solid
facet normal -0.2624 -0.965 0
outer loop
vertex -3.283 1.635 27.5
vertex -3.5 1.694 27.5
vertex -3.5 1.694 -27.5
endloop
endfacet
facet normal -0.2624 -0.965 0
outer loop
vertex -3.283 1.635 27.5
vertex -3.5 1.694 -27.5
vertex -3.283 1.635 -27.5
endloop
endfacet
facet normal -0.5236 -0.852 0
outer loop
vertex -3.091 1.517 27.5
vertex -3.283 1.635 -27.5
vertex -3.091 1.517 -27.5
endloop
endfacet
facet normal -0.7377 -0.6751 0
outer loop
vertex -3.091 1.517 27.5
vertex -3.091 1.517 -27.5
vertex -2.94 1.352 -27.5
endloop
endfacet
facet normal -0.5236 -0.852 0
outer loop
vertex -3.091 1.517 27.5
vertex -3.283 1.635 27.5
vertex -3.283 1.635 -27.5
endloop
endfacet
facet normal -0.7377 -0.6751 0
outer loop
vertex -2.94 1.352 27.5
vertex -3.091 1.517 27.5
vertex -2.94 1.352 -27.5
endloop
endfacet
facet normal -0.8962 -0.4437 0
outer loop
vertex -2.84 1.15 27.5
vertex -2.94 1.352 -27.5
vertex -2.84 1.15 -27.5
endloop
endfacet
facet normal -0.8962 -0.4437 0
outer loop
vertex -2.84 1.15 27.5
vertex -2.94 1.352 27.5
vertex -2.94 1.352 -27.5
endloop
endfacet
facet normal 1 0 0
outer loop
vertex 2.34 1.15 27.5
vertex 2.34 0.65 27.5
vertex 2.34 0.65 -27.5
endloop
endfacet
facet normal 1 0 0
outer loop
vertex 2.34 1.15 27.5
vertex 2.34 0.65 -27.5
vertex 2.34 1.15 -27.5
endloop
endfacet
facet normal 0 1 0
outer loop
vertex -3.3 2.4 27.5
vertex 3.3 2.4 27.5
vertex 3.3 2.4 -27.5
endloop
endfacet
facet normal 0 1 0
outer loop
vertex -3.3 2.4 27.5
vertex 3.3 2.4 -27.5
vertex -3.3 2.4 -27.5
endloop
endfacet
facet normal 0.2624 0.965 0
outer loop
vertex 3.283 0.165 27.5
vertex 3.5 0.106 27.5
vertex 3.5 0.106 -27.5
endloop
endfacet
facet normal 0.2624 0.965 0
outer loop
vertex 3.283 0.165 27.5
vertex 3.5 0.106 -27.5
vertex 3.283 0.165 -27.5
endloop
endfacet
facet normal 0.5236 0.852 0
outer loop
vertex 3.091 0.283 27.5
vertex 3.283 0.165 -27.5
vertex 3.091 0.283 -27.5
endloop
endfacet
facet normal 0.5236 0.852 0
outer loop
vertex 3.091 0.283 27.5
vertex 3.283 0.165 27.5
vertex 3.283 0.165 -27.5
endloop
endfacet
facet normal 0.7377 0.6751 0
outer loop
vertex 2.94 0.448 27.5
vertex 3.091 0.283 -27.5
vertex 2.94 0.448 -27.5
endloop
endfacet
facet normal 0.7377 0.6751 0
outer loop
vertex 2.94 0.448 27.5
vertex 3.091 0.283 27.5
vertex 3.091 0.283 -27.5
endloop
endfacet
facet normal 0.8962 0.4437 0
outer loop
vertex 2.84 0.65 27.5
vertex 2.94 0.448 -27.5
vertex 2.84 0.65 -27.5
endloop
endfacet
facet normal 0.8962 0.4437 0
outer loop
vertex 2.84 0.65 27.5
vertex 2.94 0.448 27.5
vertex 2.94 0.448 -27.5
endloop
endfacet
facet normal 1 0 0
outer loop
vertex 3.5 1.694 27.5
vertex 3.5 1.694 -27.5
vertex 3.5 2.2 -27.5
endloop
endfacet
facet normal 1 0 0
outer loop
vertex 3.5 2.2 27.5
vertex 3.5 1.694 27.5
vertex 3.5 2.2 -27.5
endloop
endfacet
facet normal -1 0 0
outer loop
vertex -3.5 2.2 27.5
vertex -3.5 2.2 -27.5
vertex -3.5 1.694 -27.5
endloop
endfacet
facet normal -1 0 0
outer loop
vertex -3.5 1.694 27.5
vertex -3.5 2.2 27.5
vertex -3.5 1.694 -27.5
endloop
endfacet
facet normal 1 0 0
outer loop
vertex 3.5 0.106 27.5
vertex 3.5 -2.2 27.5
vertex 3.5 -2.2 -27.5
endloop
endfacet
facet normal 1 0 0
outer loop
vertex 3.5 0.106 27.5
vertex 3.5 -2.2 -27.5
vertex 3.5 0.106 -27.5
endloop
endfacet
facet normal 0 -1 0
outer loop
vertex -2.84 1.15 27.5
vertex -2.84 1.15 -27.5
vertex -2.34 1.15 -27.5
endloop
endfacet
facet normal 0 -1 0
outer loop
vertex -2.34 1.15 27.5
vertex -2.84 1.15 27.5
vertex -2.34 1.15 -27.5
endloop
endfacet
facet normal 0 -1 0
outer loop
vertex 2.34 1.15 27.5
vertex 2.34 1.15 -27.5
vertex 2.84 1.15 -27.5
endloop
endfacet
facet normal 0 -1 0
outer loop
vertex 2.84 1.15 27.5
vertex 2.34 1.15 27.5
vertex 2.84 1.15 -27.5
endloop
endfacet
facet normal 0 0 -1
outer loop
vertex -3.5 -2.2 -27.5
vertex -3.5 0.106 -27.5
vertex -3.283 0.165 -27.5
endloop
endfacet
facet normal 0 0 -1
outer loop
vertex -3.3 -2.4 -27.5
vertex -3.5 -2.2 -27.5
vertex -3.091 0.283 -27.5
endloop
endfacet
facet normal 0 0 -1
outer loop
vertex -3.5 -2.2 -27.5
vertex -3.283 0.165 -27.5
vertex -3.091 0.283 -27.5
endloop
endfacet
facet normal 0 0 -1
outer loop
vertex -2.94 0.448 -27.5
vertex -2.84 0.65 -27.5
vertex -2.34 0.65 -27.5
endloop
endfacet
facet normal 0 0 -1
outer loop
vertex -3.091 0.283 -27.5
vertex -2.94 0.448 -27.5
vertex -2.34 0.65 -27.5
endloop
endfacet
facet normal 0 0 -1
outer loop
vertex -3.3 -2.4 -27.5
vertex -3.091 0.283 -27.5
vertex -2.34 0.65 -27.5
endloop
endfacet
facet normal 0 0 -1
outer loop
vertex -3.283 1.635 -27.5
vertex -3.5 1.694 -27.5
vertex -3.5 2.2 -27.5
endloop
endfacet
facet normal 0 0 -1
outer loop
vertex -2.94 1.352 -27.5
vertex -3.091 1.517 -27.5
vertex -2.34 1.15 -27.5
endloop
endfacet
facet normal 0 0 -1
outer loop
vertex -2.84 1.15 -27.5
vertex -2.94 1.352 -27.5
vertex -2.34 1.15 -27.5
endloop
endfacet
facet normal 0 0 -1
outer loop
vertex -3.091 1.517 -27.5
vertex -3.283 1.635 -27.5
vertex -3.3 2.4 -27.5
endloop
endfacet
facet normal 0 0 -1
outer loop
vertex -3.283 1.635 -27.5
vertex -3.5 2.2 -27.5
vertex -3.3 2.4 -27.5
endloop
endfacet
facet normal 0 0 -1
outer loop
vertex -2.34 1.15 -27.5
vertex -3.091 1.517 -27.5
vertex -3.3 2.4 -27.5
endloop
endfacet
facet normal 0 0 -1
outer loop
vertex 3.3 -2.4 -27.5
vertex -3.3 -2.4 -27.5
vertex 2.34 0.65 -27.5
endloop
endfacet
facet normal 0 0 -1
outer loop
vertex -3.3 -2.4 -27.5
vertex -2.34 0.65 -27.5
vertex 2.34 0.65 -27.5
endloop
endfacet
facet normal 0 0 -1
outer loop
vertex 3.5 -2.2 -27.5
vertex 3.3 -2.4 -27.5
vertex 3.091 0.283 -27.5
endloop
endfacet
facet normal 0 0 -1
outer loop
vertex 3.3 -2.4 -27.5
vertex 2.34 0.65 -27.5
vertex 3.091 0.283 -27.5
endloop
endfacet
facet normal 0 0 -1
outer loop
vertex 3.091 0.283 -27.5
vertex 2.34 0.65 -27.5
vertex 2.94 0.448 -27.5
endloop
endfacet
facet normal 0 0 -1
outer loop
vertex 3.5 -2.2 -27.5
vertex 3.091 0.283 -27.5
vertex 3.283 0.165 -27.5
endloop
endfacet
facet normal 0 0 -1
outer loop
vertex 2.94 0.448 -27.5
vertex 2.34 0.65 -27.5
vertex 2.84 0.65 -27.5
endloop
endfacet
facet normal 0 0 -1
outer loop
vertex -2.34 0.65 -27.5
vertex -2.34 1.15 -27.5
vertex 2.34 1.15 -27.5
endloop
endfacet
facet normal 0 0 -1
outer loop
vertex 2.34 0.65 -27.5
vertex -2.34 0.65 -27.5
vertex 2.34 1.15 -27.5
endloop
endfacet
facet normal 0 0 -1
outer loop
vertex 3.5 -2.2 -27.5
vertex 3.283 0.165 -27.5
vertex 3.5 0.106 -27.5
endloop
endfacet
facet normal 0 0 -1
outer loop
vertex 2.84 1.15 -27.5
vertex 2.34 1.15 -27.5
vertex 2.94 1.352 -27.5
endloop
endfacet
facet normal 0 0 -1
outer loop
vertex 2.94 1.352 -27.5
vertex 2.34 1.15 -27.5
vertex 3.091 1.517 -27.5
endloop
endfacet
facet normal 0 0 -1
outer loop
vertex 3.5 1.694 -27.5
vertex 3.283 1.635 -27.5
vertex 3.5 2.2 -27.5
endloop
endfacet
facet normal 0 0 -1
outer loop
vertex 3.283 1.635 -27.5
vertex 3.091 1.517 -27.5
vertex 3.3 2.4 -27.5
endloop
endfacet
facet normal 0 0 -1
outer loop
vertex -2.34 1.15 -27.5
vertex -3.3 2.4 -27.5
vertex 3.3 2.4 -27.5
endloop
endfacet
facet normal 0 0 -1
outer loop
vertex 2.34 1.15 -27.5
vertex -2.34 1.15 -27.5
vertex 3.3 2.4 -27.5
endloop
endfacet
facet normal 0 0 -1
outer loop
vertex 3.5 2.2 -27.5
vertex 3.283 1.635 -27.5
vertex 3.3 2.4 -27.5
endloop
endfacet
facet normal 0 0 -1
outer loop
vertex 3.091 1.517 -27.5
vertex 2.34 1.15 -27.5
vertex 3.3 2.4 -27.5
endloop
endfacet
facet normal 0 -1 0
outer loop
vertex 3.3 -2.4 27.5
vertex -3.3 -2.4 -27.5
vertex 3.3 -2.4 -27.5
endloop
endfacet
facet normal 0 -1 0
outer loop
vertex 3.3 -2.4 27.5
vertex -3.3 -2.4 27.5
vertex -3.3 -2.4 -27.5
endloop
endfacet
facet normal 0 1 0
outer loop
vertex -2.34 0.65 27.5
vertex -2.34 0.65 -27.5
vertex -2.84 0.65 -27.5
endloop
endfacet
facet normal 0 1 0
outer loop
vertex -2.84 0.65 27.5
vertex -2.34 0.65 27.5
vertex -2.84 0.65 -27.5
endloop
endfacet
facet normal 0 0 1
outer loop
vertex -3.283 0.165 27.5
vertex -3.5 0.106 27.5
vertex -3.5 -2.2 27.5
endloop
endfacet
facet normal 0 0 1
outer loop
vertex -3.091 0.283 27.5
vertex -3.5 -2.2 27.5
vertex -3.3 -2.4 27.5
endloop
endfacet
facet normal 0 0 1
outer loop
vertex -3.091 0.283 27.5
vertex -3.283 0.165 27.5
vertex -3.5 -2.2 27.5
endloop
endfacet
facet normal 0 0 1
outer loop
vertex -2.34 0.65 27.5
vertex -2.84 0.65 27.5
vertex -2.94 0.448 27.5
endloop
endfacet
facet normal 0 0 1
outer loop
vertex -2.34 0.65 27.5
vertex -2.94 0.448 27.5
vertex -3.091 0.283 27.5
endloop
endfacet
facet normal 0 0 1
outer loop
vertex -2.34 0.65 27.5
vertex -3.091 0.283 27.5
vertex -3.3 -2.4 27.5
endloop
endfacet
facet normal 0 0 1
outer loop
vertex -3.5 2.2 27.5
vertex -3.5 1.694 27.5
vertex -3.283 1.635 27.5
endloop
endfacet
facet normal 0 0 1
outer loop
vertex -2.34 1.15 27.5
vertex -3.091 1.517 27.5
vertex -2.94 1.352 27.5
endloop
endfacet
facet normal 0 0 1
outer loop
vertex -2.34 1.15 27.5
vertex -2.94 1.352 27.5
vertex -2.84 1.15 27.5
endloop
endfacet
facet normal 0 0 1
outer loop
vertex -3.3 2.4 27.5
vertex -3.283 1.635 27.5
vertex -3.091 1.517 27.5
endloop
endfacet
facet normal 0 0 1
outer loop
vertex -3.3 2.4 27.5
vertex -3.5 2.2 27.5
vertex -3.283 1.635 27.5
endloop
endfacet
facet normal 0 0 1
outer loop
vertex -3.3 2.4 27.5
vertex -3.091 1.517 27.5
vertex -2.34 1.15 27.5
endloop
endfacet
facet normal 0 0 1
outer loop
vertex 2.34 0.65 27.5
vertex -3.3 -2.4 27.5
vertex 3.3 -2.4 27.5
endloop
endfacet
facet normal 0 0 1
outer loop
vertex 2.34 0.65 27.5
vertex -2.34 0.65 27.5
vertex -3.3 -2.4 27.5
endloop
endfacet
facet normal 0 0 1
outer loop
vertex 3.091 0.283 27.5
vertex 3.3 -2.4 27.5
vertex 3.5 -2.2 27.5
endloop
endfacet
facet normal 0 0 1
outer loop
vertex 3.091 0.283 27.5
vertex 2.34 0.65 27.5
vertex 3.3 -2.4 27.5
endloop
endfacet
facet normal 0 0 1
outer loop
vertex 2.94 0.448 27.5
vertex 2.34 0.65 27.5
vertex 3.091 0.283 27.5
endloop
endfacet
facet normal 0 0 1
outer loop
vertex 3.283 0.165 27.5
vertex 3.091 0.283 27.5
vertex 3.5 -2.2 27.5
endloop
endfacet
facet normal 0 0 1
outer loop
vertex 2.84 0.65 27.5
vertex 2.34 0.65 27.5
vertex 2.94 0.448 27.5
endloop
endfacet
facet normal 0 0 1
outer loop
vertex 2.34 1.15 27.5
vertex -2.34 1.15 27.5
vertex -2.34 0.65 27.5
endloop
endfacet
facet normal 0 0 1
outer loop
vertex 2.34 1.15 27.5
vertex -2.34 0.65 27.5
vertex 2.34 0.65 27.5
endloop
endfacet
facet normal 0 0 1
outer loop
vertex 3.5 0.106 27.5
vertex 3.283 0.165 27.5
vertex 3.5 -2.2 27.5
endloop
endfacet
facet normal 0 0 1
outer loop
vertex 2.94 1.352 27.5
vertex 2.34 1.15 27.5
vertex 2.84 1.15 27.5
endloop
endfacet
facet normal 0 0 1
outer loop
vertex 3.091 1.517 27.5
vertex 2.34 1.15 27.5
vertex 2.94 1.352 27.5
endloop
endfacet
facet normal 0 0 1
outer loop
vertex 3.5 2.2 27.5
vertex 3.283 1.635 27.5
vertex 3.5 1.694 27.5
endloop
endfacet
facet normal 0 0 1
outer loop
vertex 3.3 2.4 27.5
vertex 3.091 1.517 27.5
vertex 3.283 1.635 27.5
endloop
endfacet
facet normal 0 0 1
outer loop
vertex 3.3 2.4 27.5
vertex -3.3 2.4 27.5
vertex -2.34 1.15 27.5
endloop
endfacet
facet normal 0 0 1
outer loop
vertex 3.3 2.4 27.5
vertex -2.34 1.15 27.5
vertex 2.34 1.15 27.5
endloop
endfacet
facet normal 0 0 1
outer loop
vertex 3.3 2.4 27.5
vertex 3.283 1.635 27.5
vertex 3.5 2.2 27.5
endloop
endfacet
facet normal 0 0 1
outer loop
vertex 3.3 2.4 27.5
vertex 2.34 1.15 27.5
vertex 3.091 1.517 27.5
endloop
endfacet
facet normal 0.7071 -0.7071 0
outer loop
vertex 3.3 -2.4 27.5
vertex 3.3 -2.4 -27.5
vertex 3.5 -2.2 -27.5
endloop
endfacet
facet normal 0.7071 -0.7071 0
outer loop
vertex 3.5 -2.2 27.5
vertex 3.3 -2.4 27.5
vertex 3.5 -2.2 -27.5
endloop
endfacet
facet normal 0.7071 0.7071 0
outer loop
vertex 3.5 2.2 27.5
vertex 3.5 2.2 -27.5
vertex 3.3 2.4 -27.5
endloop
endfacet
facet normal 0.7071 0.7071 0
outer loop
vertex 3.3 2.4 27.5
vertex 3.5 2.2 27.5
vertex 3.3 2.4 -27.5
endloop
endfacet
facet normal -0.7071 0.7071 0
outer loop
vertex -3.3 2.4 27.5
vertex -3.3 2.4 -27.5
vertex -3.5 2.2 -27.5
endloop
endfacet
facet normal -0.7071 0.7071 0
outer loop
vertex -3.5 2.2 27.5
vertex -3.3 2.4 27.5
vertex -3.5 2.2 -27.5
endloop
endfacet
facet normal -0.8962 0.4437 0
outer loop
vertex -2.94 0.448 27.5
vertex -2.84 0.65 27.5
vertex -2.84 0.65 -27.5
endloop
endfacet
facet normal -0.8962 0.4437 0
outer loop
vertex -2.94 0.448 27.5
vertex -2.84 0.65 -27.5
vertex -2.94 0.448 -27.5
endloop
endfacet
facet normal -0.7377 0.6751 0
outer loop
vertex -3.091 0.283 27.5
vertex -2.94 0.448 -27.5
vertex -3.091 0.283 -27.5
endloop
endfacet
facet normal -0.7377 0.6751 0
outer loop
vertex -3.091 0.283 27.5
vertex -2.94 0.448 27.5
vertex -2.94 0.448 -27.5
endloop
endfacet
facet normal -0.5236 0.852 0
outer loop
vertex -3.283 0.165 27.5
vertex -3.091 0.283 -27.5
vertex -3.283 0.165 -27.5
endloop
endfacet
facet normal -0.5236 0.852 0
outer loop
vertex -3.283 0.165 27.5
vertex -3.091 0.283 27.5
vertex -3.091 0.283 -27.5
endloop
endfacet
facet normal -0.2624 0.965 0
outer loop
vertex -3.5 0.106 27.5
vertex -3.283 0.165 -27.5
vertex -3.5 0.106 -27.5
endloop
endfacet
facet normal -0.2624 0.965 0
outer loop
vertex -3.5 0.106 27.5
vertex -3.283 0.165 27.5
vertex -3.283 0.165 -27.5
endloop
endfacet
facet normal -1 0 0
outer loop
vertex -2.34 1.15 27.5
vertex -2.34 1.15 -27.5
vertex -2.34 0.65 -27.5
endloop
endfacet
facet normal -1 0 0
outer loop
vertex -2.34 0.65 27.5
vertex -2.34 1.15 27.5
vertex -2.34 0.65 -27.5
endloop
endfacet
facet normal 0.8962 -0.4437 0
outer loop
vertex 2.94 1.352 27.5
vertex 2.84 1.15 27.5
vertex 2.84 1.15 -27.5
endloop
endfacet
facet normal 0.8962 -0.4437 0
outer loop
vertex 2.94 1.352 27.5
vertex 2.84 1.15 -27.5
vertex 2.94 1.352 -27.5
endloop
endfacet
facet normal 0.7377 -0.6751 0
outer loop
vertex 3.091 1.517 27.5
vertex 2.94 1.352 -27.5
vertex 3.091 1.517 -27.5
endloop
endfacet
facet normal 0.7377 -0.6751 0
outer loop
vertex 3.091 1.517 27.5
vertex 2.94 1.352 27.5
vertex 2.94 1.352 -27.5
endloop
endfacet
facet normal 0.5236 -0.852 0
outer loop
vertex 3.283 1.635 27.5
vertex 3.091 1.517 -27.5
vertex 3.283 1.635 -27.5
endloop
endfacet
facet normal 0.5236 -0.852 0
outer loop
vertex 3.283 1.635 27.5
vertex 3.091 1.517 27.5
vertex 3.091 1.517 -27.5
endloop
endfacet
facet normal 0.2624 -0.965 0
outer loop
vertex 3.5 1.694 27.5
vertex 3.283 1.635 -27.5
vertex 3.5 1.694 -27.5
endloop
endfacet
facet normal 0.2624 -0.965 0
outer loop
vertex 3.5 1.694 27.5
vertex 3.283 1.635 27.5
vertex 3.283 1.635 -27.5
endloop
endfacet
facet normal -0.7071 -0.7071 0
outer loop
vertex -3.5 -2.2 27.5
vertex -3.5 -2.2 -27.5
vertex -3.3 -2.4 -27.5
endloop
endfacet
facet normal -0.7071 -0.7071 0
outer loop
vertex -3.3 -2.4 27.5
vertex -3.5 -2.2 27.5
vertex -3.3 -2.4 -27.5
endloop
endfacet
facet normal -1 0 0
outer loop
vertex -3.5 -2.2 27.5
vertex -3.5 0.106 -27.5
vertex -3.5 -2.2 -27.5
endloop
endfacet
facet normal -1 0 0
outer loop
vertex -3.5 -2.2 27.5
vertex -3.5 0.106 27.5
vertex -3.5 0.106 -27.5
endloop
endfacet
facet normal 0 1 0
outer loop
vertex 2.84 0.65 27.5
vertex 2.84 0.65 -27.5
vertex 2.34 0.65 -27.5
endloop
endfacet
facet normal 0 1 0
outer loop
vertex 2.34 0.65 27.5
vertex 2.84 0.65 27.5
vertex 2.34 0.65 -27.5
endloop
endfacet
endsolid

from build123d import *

# Parameters (mm, degrees)
EXTRUDE1_DEPTH = 27.5


with BuildPart() as part:
    # Sketch1 → Extrude1 (new, symmetric)
    with BuildSketch(Plane.XY):
        with BuildLine():
            Line((-3.3, -2.4), (3.3, -2.4))
            Line((3.3, -2.4), (3.5, -2.2))
            Line((3.5, -2.2), (3.5, 0.106274607))
            ThreePointArc((3.5, 0.106274607), (3.091294745, 0.282570681), (2.840065792, 0.65))
            Line((2.840065792, 0.65), (2.340065792, 0.65))
            Line((2.340065792, 0.65), (2.340065792, 1.15))
            Line((2.340065792, 1.15), (2.840065792, 1.15))
            ThreePointArc((2.840065792, 1.15), (3.091294745, 1.517429319), (3.5, 1.693725393))
            Line((3.5, 1.693725393), (3.5, 2.2))
            Line((3.5, 2.2), (3.3, 2.4))
            Line((3.3, 2.4), (-3.3, 2.4))
            Line((-3.3, 2.4), (-3.5, 2.2))
            Line((-3.5, 2.2), (-3.5, 1.693725393))
            ThreePointArc((-3.5, 1.693725393), (-3.091294745, 1.517429319), (-2.840065792, 1.15))
            Line((-2.840065792, 1.15), (-2.340065792, 1.15))
            Line((-2.340065792, 1.15), (-2.340065792, 0.65))
            Line((-2.340065792, 0.65), (-2.840065792, 0.65))
            ThreePointArc((-2.840065792, 0.65), (-3.091294745, 0.282570681), (-3.5, 0.106274607))
            Line((-3.5, 0.106274607), (-3.5, -2.2))
            Line((-3.5, -2.2), (-3.3, -2.4))
        make_face()
    extrude(amount=EXTRUDE1_DEPTH, both=True)


solid = part.part
